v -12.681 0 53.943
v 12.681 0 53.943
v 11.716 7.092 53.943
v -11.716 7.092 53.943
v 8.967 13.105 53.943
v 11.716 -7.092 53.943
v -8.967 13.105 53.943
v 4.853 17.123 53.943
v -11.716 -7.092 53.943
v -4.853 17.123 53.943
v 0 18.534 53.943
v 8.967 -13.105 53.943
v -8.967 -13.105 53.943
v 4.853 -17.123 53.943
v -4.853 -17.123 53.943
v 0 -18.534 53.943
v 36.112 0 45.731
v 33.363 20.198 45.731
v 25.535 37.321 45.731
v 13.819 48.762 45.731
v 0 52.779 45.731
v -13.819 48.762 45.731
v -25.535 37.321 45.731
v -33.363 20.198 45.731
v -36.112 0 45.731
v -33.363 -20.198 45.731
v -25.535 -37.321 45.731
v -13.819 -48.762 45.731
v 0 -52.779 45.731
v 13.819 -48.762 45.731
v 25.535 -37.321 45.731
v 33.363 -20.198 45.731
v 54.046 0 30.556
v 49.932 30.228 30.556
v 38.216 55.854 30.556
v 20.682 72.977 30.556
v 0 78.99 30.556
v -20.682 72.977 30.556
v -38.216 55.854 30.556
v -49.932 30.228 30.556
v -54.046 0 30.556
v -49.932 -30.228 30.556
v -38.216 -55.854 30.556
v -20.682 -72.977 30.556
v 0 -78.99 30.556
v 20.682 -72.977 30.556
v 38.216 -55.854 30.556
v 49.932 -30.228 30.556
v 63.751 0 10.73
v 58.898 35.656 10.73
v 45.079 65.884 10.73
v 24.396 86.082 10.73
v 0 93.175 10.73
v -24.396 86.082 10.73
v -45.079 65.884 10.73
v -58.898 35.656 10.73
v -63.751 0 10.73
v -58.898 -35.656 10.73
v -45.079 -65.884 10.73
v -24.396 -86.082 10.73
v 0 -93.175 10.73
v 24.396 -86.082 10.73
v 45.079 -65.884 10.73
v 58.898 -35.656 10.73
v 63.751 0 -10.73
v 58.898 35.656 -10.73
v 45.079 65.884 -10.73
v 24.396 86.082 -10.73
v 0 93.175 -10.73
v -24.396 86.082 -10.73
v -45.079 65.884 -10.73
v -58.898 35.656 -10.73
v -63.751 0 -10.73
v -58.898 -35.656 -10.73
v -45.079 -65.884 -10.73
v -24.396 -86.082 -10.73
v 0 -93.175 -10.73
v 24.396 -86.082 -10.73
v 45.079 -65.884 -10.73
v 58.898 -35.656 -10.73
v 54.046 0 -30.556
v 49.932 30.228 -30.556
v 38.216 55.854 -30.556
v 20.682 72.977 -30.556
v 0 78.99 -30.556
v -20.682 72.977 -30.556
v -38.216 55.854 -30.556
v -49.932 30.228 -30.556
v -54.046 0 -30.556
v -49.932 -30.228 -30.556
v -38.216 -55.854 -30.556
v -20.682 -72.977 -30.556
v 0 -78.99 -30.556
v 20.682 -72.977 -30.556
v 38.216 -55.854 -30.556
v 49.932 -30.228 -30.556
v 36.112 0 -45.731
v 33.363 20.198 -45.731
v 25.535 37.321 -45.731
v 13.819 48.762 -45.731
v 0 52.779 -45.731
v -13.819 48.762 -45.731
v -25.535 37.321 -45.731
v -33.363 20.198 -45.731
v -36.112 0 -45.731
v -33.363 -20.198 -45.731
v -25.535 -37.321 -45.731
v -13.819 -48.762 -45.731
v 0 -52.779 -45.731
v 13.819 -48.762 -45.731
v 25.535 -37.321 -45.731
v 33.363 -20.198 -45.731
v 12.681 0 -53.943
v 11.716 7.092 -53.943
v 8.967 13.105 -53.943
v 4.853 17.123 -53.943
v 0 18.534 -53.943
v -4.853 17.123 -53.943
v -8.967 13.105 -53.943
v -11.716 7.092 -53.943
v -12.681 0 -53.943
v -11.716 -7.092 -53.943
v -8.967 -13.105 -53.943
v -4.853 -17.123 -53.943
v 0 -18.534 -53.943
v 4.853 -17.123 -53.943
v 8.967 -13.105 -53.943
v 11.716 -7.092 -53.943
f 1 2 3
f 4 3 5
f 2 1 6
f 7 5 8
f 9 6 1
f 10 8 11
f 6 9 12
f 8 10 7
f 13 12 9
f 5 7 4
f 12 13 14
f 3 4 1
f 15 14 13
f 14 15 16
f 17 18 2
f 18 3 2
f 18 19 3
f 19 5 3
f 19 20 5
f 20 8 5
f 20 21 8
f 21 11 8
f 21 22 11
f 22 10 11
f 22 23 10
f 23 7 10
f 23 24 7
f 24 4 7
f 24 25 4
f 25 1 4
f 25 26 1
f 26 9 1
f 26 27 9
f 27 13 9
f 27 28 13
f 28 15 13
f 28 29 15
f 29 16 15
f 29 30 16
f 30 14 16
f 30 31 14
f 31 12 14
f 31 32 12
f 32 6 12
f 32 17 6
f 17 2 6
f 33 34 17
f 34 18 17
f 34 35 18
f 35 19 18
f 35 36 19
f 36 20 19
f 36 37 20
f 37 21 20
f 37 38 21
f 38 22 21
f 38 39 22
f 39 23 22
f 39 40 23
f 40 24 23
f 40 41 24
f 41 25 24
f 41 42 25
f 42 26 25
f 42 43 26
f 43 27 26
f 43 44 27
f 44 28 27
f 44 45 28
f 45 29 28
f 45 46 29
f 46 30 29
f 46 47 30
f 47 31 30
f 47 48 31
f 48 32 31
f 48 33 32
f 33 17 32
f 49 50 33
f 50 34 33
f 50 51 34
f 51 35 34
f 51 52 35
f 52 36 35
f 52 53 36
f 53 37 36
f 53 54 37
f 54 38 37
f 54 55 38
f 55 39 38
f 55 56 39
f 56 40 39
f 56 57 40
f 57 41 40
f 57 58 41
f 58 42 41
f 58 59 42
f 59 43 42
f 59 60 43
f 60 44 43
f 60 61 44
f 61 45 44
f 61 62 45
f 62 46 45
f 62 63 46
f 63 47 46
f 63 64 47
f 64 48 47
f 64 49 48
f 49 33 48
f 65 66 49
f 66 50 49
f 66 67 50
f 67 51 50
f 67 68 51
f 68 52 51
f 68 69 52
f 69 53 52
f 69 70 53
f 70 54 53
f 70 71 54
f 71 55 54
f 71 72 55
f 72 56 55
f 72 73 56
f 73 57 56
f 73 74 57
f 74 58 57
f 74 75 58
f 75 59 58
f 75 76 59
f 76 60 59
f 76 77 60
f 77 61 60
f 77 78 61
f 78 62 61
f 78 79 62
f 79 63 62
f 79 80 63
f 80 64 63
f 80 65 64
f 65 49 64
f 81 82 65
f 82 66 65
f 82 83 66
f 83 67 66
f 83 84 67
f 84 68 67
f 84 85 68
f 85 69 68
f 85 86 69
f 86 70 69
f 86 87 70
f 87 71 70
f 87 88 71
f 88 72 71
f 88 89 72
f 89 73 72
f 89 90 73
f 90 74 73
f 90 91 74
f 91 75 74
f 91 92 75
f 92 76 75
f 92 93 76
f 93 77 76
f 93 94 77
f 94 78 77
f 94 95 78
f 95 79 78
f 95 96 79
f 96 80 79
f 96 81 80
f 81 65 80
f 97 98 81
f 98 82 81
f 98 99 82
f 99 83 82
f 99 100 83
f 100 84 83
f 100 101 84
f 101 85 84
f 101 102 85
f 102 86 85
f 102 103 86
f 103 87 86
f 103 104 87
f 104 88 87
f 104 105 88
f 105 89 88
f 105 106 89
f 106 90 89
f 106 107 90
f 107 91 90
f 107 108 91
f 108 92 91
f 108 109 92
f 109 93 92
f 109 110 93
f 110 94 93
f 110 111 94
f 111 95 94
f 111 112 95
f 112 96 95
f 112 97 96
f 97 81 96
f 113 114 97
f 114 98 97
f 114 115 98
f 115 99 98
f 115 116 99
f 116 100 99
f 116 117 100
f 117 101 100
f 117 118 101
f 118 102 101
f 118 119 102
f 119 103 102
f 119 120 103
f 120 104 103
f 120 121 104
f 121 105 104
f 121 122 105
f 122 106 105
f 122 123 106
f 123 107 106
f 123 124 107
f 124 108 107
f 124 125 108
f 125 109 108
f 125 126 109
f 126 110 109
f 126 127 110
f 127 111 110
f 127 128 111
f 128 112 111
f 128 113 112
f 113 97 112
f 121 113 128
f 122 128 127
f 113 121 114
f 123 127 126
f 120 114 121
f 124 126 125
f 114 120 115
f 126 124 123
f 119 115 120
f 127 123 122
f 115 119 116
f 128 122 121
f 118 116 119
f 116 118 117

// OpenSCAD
// Generated by SolidPython 1.0.1 on 2020-07-29 00:46:51


scale(v = [13, 19, 11]) {
	sphere(r = 5);
}
/***********************************************
*********      SolidPython code:      **********
************************************************
 
# import packages: SolidPython
from solid import *
from solid.utils import *
from itertools import chain, combinations, permutations


class Resize:

    def __init__(self, scad_file):
        self.scad_file = scad_file
        #self.scad_file = import_scad(scad_file)
        # cone/cylinder param:
        self.r1 = 0
        self.r2 = 0
        self.h = 0
        # rectangular prism param:
        self.w = 0
        self.l = 0
        # ellipse param:
        self.r = 0

    # import OpenScad code (file name corresponds to shape)


    # classify shape + parameters
    def assign(self, param1, param2, param3):
        if self.scad_file == 'cone.scad':
            self.r1 = param1
            self.r2 = param2
            self.h = param3
        elif self.scad_file == 'cylinder.scad':
            self.r1 = param1
            self.r2 = param2
            self.h = param3
        elif self.scad_file == 'rectangularPrism.scad':
            self.h = param1
            self.l = param2
            self.w = param3
        else:
            self.r = param1
            self.h = param2

    # resize parameters
    def iterate(self):
        x = range(3, 20, 2)
        i = 1
        if self.scad_file == 'cone.scad':
            tempList = list(permutations(x, 2))
            for temp in tempList:
                param1 = temp[0]
                param2 = temp[1]
                filepath = 'produced_scad_files/' + 'cone' + str(param1) + '_' + str(param2) + '_' + '.scad'
                scad_render_to_file(cylinder(h=param1, r1=param2, r2=0), filepath)

        elif self.scad_file == 'cylinder.scad':
            tempList = list(permutations(x, 3))
            for temp in tempList:
                param1 = temp[0]
                param2 = temp[1]
                filepath = 'produced_scad_files/' + 'cylinder' + str(param1) + '_' + str(param2) + '_' + '.scad'
                scad_render_to_file(cylinder(h=param1, r1=param2, r2=param2), filepath)

        elif self.scad_file == 'rectangularPrism.scad':
            tempList = list(permutations(x, 3))
            for temp in tempList:
                param1 = temp[0]
                param2 = temp[1]
                param3 = temp[2]
                filepath = 'produced_scad_files/' + 'rectangularPrism' + str(param1) + '_' + str(param2) + '_' + str(
                    param3) + '.scad'
                scad_render_to_file(cube(size=(param1, param2, param3)), filepath)

        elif self.scad_file == 'ellipse.scad':
            tempList = list(permutations(x, 4))
            for temp in tempList:
                param1 = temp[0]
                param2 = temp[1]
                param3 = temp[2]
                param4 = temp[3]
                filepath = 'produced_scad_files/' + 'ellipse' + str(param1) + '_' + str(param2) + '_' + str(param3) + '_' + str(param4) + '.scad'
                scad_render_to_file(scale([param1, param2, param3])(sphere(r=param4)), filepath)

    def render_to_scadfile(self):
        scad_render_to_file(scad, 'example.scad') 
 
************************************************/
